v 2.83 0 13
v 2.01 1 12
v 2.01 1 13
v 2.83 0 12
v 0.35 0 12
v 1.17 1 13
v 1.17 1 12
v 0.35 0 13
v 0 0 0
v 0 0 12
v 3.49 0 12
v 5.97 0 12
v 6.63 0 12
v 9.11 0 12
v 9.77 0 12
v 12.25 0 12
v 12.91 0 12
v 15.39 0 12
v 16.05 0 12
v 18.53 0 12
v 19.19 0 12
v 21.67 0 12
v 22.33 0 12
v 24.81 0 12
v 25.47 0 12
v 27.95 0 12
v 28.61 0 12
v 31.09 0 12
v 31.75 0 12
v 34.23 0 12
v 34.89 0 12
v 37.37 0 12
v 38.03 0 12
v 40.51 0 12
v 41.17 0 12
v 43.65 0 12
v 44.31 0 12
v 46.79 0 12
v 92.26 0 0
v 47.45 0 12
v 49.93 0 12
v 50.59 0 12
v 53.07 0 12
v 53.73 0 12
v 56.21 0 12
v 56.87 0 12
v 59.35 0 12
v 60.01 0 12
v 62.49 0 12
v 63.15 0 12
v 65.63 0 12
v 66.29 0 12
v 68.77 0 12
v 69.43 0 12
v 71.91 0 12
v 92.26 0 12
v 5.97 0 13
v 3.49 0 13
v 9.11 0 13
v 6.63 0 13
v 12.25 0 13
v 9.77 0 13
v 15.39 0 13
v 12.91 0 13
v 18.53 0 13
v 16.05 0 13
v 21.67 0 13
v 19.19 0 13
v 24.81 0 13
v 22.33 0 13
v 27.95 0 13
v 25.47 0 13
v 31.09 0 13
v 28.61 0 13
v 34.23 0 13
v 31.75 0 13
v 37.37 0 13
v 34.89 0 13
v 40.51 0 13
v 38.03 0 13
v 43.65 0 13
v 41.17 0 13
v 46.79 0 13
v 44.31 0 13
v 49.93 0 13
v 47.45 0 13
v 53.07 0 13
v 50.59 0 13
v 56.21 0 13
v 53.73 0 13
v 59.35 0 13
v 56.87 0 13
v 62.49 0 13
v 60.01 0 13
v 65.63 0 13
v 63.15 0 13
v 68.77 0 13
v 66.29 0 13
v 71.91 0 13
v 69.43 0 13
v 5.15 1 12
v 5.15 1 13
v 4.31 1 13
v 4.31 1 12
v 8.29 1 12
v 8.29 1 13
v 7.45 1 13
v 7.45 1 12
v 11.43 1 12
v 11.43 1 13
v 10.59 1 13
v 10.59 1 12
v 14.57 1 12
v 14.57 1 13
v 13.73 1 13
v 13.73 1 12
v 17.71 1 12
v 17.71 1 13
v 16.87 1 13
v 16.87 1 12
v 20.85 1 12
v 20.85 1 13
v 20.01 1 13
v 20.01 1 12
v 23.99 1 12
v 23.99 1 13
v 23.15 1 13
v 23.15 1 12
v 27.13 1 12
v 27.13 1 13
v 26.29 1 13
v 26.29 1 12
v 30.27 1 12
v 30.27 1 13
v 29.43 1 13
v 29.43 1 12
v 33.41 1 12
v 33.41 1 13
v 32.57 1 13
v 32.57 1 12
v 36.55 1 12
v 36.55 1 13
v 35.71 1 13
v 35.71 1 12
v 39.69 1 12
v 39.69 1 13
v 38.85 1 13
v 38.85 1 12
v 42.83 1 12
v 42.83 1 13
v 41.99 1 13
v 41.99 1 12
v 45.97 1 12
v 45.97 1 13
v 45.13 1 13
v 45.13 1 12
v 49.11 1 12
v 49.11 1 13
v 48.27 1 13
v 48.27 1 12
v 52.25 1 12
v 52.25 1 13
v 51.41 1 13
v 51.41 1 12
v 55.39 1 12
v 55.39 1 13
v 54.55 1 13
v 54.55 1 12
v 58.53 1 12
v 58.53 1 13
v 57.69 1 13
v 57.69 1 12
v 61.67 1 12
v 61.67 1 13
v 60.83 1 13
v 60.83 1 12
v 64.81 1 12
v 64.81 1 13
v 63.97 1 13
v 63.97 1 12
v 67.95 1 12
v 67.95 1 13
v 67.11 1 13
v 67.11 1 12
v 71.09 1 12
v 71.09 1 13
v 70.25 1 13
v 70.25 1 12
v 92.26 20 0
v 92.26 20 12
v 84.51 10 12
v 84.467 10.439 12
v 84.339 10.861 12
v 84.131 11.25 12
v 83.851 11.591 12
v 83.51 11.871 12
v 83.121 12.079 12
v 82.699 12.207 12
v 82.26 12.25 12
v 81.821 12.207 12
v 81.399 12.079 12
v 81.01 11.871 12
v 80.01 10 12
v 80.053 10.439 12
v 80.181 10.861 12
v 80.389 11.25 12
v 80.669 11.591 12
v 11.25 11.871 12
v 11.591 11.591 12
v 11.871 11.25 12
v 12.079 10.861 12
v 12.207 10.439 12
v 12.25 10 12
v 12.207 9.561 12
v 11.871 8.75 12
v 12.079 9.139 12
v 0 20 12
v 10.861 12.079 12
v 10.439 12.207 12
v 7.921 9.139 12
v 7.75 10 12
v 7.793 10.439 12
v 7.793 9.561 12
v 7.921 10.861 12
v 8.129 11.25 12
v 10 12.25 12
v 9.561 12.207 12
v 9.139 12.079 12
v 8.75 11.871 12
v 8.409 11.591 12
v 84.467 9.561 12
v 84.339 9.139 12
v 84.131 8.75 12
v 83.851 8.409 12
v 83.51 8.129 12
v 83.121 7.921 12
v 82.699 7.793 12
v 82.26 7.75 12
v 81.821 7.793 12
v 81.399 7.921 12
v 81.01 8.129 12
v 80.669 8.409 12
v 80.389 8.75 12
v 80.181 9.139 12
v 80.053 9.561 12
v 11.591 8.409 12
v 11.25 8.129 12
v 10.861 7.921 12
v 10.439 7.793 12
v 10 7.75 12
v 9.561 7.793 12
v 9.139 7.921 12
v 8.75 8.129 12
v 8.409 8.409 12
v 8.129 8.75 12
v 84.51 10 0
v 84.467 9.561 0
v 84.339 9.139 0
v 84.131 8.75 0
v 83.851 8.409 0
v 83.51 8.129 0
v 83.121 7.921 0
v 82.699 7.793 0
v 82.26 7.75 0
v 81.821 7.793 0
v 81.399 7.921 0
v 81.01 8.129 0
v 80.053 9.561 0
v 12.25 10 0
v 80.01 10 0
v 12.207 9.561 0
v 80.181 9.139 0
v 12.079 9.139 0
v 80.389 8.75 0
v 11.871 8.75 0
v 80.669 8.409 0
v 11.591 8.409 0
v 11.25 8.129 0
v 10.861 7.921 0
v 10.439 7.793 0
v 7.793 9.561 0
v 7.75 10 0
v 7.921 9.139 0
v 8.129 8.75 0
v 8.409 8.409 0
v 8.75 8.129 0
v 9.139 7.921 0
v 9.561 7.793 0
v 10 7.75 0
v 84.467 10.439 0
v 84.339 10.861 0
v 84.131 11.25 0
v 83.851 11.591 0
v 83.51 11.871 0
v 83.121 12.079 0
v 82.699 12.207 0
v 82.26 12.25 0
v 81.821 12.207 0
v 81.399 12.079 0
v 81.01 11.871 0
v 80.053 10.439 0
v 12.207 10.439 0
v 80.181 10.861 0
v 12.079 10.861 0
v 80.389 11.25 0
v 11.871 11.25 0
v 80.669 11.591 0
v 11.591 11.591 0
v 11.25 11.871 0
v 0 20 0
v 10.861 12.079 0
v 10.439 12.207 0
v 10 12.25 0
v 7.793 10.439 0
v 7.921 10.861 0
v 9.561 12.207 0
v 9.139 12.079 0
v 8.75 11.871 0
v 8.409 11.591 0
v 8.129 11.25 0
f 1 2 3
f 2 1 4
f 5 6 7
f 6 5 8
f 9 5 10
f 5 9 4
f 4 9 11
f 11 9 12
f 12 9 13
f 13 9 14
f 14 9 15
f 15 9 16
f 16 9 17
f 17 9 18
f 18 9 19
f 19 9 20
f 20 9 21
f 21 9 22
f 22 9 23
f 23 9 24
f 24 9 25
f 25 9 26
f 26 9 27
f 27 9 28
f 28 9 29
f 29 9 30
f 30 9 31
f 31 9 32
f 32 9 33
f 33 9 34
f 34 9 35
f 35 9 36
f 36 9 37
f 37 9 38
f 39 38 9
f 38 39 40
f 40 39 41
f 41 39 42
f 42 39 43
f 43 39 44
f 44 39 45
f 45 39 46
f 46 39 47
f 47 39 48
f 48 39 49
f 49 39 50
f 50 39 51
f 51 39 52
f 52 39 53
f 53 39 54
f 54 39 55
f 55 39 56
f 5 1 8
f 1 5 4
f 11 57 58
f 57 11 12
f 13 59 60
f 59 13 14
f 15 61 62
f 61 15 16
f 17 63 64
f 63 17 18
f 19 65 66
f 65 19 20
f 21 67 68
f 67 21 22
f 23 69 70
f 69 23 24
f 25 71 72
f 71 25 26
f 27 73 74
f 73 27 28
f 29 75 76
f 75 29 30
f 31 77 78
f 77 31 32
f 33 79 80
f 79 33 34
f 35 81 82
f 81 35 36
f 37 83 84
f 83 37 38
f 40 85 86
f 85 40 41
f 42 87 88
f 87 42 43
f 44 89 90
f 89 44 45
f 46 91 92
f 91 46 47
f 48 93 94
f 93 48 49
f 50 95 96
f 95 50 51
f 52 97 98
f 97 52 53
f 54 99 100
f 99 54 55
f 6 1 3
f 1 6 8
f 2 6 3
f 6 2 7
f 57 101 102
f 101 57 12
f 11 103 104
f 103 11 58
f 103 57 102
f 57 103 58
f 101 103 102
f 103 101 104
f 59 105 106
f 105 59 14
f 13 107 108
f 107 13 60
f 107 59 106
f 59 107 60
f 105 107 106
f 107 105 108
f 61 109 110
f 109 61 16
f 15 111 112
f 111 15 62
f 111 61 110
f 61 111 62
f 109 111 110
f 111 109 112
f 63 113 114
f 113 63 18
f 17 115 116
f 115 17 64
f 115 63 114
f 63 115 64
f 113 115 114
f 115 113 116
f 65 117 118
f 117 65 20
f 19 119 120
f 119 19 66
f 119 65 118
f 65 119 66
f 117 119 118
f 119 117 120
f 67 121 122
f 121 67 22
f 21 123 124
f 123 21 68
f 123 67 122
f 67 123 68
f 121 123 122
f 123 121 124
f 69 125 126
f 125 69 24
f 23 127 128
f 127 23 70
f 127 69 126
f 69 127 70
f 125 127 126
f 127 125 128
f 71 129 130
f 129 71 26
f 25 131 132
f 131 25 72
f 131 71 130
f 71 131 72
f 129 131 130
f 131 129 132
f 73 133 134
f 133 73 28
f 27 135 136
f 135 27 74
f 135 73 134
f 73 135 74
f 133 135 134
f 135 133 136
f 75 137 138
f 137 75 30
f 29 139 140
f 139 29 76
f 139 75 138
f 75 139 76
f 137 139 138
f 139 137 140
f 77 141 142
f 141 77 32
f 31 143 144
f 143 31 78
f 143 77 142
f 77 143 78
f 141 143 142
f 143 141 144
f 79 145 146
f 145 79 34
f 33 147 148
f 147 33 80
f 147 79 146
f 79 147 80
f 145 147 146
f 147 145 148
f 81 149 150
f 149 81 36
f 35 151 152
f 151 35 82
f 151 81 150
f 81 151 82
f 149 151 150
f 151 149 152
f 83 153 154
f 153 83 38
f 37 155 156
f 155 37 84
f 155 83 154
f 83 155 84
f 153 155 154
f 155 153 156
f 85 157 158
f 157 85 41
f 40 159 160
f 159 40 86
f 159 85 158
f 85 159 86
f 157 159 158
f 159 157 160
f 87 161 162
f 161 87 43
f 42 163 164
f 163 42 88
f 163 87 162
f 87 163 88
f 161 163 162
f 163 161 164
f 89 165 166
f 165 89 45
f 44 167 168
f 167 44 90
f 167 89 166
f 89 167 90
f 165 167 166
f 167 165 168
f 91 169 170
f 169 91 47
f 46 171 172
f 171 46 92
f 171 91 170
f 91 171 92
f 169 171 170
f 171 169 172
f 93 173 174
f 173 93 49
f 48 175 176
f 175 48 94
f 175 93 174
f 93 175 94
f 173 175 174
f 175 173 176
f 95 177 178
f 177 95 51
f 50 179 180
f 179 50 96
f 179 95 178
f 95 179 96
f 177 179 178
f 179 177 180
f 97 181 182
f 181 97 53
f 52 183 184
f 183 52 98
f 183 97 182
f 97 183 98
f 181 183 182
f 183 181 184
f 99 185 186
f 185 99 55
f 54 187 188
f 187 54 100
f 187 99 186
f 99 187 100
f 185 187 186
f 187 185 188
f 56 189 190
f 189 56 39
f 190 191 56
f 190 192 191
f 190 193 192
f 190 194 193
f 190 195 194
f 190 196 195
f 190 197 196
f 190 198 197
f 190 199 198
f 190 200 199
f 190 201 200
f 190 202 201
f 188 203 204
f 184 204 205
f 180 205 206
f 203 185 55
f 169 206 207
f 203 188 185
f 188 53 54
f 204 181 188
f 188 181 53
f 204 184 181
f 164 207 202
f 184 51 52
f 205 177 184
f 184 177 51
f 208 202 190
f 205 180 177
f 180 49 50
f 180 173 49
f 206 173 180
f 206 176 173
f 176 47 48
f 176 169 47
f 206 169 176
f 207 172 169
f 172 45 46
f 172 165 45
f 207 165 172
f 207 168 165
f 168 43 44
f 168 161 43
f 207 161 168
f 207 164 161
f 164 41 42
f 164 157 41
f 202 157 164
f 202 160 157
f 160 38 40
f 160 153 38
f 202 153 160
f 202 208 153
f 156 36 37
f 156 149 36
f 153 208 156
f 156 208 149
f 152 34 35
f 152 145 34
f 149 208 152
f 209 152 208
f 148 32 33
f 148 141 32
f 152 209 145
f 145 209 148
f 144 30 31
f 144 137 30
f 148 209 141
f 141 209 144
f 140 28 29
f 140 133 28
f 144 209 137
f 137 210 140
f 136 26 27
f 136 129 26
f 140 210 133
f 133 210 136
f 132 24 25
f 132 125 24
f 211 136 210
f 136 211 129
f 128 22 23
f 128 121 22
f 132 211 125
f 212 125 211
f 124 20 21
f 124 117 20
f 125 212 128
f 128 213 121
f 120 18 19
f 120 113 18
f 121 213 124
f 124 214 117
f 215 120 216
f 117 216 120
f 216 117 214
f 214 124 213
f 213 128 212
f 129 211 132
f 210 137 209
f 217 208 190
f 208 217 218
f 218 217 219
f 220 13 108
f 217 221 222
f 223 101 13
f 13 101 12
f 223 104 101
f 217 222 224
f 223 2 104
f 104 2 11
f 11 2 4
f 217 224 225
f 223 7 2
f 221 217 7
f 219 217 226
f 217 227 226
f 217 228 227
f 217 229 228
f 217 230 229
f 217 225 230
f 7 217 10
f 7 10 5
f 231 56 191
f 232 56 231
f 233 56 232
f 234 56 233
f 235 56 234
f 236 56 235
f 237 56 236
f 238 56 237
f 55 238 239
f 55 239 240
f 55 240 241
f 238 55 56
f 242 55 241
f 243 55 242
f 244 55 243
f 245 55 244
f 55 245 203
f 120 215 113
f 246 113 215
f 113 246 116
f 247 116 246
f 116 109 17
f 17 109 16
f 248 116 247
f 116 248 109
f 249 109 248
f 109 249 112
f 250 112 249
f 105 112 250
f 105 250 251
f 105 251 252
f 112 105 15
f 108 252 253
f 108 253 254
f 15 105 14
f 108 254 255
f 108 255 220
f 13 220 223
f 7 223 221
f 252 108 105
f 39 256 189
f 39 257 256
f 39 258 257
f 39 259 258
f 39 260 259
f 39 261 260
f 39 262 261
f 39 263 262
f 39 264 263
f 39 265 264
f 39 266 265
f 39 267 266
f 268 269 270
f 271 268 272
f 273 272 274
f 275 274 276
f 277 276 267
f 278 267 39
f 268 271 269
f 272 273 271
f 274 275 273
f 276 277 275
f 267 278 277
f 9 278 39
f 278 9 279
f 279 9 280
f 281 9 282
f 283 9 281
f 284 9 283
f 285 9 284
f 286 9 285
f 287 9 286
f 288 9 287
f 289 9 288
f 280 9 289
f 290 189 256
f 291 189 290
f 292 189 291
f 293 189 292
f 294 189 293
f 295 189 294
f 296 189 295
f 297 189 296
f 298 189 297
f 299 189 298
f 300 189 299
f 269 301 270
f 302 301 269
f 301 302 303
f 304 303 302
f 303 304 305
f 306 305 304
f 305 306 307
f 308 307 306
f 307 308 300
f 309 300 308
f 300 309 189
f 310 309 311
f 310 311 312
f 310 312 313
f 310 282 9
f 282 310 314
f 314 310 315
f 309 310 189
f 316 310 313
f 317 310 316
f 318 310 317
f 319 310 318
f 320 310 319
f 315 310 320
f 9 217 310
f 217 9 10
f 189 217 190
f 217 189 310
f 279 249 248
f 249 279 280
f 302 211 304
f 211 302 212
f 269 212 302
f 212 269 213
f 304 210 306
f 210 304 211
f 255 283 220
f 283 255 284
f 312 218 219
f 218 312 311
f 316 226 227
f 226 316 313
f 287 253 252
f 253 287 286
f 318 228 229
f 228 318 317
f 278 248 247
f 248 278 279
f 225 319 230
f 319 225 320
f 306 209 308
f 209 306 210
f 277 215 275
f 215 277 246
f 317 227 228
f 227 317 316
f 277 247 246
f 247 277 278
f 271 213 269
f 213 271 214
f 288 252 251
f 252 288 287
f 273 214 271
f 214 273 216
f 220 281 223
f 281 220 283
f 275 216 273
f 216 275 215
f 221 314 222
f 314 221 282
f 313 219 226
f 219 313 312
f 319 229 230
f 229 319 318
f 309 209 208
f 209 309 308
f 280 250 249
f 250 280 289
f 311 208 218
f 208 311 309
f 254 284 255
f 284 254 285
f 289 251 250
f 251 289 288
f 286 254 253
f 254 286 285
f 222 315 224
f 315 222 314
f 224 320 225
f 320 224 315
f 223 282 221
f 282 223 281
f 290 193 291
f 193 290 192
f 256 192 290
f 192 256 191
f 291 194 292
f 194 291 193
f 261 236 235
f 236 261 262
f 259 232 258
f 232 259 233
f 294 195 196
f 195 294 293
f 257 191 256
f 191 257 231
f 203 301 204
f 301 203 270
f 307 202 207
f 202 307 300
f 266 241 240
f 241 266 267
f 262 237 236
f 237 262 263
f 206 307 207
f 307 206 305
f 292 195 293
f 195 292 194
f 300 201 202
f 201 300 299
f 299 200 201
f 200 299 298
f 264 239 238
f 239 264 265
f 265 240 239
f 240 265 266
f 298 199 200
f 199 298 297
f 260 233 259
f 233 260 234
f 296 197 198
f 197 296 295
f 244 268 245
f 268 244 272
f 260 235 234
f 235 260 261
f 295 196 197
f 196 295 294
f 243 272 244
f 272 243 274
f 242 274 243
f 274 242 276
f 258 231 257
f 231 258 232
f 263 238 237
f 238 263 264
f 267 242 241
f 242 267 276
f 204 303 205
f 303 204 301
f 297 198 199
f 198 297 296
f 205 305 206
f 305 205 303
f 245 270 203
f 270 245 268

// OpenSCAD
$fn = 32;

// ----------------------------------------------------------------------
// Gear rack: m=1 z=23, 92.26 x 20 x 13 mm
// ----------------------------------------------------------------------

// --- parameters (mm) ---
length = 92.26;           // rack length, X
width = 20;               // rack width, Y
height = 13;              // overall height, Z
module_m = 1;             // module
back_t = 12;              // tooth root line height
pitch = 3.14;             // circular pitch
tip_w = 0.84;             // tooth thickness at the tip
root_w = 2.48;            // tooth thickness at the root line
hole_d = 4.5;             // mounting hole
sink = 0.6;               // tooth root overlap into the body

tooth_span = 72.26;

module tooth(x0) {
  /* 20 deg flank profile, sunk into the body for a positive overlap */
  translate([x0, 0, back_t - sink])
    linear_extrude(height = height - back_t + sink)
      polygon(points = [[-root_w / 2, 0], [root_w / 2, 0],
                        [tip_w / 2, height - back_t],
                        [-tip_w / 2, height - back_t]]);
}

difference() {
  union() {
    cube([length, width, back_t]);
    for (i = [0 : 23 - 1])
      tooth((i + 0.5) * pitch + (tooth_span - 23 * pitch) / 2);
  }
  translate([10, 10, -1]) cylinder(h = back_t + 2, d = hole_d);
  translate([82.26, 10, -1]) cylinder(h = back_t + 2, d = hole_d);
}
